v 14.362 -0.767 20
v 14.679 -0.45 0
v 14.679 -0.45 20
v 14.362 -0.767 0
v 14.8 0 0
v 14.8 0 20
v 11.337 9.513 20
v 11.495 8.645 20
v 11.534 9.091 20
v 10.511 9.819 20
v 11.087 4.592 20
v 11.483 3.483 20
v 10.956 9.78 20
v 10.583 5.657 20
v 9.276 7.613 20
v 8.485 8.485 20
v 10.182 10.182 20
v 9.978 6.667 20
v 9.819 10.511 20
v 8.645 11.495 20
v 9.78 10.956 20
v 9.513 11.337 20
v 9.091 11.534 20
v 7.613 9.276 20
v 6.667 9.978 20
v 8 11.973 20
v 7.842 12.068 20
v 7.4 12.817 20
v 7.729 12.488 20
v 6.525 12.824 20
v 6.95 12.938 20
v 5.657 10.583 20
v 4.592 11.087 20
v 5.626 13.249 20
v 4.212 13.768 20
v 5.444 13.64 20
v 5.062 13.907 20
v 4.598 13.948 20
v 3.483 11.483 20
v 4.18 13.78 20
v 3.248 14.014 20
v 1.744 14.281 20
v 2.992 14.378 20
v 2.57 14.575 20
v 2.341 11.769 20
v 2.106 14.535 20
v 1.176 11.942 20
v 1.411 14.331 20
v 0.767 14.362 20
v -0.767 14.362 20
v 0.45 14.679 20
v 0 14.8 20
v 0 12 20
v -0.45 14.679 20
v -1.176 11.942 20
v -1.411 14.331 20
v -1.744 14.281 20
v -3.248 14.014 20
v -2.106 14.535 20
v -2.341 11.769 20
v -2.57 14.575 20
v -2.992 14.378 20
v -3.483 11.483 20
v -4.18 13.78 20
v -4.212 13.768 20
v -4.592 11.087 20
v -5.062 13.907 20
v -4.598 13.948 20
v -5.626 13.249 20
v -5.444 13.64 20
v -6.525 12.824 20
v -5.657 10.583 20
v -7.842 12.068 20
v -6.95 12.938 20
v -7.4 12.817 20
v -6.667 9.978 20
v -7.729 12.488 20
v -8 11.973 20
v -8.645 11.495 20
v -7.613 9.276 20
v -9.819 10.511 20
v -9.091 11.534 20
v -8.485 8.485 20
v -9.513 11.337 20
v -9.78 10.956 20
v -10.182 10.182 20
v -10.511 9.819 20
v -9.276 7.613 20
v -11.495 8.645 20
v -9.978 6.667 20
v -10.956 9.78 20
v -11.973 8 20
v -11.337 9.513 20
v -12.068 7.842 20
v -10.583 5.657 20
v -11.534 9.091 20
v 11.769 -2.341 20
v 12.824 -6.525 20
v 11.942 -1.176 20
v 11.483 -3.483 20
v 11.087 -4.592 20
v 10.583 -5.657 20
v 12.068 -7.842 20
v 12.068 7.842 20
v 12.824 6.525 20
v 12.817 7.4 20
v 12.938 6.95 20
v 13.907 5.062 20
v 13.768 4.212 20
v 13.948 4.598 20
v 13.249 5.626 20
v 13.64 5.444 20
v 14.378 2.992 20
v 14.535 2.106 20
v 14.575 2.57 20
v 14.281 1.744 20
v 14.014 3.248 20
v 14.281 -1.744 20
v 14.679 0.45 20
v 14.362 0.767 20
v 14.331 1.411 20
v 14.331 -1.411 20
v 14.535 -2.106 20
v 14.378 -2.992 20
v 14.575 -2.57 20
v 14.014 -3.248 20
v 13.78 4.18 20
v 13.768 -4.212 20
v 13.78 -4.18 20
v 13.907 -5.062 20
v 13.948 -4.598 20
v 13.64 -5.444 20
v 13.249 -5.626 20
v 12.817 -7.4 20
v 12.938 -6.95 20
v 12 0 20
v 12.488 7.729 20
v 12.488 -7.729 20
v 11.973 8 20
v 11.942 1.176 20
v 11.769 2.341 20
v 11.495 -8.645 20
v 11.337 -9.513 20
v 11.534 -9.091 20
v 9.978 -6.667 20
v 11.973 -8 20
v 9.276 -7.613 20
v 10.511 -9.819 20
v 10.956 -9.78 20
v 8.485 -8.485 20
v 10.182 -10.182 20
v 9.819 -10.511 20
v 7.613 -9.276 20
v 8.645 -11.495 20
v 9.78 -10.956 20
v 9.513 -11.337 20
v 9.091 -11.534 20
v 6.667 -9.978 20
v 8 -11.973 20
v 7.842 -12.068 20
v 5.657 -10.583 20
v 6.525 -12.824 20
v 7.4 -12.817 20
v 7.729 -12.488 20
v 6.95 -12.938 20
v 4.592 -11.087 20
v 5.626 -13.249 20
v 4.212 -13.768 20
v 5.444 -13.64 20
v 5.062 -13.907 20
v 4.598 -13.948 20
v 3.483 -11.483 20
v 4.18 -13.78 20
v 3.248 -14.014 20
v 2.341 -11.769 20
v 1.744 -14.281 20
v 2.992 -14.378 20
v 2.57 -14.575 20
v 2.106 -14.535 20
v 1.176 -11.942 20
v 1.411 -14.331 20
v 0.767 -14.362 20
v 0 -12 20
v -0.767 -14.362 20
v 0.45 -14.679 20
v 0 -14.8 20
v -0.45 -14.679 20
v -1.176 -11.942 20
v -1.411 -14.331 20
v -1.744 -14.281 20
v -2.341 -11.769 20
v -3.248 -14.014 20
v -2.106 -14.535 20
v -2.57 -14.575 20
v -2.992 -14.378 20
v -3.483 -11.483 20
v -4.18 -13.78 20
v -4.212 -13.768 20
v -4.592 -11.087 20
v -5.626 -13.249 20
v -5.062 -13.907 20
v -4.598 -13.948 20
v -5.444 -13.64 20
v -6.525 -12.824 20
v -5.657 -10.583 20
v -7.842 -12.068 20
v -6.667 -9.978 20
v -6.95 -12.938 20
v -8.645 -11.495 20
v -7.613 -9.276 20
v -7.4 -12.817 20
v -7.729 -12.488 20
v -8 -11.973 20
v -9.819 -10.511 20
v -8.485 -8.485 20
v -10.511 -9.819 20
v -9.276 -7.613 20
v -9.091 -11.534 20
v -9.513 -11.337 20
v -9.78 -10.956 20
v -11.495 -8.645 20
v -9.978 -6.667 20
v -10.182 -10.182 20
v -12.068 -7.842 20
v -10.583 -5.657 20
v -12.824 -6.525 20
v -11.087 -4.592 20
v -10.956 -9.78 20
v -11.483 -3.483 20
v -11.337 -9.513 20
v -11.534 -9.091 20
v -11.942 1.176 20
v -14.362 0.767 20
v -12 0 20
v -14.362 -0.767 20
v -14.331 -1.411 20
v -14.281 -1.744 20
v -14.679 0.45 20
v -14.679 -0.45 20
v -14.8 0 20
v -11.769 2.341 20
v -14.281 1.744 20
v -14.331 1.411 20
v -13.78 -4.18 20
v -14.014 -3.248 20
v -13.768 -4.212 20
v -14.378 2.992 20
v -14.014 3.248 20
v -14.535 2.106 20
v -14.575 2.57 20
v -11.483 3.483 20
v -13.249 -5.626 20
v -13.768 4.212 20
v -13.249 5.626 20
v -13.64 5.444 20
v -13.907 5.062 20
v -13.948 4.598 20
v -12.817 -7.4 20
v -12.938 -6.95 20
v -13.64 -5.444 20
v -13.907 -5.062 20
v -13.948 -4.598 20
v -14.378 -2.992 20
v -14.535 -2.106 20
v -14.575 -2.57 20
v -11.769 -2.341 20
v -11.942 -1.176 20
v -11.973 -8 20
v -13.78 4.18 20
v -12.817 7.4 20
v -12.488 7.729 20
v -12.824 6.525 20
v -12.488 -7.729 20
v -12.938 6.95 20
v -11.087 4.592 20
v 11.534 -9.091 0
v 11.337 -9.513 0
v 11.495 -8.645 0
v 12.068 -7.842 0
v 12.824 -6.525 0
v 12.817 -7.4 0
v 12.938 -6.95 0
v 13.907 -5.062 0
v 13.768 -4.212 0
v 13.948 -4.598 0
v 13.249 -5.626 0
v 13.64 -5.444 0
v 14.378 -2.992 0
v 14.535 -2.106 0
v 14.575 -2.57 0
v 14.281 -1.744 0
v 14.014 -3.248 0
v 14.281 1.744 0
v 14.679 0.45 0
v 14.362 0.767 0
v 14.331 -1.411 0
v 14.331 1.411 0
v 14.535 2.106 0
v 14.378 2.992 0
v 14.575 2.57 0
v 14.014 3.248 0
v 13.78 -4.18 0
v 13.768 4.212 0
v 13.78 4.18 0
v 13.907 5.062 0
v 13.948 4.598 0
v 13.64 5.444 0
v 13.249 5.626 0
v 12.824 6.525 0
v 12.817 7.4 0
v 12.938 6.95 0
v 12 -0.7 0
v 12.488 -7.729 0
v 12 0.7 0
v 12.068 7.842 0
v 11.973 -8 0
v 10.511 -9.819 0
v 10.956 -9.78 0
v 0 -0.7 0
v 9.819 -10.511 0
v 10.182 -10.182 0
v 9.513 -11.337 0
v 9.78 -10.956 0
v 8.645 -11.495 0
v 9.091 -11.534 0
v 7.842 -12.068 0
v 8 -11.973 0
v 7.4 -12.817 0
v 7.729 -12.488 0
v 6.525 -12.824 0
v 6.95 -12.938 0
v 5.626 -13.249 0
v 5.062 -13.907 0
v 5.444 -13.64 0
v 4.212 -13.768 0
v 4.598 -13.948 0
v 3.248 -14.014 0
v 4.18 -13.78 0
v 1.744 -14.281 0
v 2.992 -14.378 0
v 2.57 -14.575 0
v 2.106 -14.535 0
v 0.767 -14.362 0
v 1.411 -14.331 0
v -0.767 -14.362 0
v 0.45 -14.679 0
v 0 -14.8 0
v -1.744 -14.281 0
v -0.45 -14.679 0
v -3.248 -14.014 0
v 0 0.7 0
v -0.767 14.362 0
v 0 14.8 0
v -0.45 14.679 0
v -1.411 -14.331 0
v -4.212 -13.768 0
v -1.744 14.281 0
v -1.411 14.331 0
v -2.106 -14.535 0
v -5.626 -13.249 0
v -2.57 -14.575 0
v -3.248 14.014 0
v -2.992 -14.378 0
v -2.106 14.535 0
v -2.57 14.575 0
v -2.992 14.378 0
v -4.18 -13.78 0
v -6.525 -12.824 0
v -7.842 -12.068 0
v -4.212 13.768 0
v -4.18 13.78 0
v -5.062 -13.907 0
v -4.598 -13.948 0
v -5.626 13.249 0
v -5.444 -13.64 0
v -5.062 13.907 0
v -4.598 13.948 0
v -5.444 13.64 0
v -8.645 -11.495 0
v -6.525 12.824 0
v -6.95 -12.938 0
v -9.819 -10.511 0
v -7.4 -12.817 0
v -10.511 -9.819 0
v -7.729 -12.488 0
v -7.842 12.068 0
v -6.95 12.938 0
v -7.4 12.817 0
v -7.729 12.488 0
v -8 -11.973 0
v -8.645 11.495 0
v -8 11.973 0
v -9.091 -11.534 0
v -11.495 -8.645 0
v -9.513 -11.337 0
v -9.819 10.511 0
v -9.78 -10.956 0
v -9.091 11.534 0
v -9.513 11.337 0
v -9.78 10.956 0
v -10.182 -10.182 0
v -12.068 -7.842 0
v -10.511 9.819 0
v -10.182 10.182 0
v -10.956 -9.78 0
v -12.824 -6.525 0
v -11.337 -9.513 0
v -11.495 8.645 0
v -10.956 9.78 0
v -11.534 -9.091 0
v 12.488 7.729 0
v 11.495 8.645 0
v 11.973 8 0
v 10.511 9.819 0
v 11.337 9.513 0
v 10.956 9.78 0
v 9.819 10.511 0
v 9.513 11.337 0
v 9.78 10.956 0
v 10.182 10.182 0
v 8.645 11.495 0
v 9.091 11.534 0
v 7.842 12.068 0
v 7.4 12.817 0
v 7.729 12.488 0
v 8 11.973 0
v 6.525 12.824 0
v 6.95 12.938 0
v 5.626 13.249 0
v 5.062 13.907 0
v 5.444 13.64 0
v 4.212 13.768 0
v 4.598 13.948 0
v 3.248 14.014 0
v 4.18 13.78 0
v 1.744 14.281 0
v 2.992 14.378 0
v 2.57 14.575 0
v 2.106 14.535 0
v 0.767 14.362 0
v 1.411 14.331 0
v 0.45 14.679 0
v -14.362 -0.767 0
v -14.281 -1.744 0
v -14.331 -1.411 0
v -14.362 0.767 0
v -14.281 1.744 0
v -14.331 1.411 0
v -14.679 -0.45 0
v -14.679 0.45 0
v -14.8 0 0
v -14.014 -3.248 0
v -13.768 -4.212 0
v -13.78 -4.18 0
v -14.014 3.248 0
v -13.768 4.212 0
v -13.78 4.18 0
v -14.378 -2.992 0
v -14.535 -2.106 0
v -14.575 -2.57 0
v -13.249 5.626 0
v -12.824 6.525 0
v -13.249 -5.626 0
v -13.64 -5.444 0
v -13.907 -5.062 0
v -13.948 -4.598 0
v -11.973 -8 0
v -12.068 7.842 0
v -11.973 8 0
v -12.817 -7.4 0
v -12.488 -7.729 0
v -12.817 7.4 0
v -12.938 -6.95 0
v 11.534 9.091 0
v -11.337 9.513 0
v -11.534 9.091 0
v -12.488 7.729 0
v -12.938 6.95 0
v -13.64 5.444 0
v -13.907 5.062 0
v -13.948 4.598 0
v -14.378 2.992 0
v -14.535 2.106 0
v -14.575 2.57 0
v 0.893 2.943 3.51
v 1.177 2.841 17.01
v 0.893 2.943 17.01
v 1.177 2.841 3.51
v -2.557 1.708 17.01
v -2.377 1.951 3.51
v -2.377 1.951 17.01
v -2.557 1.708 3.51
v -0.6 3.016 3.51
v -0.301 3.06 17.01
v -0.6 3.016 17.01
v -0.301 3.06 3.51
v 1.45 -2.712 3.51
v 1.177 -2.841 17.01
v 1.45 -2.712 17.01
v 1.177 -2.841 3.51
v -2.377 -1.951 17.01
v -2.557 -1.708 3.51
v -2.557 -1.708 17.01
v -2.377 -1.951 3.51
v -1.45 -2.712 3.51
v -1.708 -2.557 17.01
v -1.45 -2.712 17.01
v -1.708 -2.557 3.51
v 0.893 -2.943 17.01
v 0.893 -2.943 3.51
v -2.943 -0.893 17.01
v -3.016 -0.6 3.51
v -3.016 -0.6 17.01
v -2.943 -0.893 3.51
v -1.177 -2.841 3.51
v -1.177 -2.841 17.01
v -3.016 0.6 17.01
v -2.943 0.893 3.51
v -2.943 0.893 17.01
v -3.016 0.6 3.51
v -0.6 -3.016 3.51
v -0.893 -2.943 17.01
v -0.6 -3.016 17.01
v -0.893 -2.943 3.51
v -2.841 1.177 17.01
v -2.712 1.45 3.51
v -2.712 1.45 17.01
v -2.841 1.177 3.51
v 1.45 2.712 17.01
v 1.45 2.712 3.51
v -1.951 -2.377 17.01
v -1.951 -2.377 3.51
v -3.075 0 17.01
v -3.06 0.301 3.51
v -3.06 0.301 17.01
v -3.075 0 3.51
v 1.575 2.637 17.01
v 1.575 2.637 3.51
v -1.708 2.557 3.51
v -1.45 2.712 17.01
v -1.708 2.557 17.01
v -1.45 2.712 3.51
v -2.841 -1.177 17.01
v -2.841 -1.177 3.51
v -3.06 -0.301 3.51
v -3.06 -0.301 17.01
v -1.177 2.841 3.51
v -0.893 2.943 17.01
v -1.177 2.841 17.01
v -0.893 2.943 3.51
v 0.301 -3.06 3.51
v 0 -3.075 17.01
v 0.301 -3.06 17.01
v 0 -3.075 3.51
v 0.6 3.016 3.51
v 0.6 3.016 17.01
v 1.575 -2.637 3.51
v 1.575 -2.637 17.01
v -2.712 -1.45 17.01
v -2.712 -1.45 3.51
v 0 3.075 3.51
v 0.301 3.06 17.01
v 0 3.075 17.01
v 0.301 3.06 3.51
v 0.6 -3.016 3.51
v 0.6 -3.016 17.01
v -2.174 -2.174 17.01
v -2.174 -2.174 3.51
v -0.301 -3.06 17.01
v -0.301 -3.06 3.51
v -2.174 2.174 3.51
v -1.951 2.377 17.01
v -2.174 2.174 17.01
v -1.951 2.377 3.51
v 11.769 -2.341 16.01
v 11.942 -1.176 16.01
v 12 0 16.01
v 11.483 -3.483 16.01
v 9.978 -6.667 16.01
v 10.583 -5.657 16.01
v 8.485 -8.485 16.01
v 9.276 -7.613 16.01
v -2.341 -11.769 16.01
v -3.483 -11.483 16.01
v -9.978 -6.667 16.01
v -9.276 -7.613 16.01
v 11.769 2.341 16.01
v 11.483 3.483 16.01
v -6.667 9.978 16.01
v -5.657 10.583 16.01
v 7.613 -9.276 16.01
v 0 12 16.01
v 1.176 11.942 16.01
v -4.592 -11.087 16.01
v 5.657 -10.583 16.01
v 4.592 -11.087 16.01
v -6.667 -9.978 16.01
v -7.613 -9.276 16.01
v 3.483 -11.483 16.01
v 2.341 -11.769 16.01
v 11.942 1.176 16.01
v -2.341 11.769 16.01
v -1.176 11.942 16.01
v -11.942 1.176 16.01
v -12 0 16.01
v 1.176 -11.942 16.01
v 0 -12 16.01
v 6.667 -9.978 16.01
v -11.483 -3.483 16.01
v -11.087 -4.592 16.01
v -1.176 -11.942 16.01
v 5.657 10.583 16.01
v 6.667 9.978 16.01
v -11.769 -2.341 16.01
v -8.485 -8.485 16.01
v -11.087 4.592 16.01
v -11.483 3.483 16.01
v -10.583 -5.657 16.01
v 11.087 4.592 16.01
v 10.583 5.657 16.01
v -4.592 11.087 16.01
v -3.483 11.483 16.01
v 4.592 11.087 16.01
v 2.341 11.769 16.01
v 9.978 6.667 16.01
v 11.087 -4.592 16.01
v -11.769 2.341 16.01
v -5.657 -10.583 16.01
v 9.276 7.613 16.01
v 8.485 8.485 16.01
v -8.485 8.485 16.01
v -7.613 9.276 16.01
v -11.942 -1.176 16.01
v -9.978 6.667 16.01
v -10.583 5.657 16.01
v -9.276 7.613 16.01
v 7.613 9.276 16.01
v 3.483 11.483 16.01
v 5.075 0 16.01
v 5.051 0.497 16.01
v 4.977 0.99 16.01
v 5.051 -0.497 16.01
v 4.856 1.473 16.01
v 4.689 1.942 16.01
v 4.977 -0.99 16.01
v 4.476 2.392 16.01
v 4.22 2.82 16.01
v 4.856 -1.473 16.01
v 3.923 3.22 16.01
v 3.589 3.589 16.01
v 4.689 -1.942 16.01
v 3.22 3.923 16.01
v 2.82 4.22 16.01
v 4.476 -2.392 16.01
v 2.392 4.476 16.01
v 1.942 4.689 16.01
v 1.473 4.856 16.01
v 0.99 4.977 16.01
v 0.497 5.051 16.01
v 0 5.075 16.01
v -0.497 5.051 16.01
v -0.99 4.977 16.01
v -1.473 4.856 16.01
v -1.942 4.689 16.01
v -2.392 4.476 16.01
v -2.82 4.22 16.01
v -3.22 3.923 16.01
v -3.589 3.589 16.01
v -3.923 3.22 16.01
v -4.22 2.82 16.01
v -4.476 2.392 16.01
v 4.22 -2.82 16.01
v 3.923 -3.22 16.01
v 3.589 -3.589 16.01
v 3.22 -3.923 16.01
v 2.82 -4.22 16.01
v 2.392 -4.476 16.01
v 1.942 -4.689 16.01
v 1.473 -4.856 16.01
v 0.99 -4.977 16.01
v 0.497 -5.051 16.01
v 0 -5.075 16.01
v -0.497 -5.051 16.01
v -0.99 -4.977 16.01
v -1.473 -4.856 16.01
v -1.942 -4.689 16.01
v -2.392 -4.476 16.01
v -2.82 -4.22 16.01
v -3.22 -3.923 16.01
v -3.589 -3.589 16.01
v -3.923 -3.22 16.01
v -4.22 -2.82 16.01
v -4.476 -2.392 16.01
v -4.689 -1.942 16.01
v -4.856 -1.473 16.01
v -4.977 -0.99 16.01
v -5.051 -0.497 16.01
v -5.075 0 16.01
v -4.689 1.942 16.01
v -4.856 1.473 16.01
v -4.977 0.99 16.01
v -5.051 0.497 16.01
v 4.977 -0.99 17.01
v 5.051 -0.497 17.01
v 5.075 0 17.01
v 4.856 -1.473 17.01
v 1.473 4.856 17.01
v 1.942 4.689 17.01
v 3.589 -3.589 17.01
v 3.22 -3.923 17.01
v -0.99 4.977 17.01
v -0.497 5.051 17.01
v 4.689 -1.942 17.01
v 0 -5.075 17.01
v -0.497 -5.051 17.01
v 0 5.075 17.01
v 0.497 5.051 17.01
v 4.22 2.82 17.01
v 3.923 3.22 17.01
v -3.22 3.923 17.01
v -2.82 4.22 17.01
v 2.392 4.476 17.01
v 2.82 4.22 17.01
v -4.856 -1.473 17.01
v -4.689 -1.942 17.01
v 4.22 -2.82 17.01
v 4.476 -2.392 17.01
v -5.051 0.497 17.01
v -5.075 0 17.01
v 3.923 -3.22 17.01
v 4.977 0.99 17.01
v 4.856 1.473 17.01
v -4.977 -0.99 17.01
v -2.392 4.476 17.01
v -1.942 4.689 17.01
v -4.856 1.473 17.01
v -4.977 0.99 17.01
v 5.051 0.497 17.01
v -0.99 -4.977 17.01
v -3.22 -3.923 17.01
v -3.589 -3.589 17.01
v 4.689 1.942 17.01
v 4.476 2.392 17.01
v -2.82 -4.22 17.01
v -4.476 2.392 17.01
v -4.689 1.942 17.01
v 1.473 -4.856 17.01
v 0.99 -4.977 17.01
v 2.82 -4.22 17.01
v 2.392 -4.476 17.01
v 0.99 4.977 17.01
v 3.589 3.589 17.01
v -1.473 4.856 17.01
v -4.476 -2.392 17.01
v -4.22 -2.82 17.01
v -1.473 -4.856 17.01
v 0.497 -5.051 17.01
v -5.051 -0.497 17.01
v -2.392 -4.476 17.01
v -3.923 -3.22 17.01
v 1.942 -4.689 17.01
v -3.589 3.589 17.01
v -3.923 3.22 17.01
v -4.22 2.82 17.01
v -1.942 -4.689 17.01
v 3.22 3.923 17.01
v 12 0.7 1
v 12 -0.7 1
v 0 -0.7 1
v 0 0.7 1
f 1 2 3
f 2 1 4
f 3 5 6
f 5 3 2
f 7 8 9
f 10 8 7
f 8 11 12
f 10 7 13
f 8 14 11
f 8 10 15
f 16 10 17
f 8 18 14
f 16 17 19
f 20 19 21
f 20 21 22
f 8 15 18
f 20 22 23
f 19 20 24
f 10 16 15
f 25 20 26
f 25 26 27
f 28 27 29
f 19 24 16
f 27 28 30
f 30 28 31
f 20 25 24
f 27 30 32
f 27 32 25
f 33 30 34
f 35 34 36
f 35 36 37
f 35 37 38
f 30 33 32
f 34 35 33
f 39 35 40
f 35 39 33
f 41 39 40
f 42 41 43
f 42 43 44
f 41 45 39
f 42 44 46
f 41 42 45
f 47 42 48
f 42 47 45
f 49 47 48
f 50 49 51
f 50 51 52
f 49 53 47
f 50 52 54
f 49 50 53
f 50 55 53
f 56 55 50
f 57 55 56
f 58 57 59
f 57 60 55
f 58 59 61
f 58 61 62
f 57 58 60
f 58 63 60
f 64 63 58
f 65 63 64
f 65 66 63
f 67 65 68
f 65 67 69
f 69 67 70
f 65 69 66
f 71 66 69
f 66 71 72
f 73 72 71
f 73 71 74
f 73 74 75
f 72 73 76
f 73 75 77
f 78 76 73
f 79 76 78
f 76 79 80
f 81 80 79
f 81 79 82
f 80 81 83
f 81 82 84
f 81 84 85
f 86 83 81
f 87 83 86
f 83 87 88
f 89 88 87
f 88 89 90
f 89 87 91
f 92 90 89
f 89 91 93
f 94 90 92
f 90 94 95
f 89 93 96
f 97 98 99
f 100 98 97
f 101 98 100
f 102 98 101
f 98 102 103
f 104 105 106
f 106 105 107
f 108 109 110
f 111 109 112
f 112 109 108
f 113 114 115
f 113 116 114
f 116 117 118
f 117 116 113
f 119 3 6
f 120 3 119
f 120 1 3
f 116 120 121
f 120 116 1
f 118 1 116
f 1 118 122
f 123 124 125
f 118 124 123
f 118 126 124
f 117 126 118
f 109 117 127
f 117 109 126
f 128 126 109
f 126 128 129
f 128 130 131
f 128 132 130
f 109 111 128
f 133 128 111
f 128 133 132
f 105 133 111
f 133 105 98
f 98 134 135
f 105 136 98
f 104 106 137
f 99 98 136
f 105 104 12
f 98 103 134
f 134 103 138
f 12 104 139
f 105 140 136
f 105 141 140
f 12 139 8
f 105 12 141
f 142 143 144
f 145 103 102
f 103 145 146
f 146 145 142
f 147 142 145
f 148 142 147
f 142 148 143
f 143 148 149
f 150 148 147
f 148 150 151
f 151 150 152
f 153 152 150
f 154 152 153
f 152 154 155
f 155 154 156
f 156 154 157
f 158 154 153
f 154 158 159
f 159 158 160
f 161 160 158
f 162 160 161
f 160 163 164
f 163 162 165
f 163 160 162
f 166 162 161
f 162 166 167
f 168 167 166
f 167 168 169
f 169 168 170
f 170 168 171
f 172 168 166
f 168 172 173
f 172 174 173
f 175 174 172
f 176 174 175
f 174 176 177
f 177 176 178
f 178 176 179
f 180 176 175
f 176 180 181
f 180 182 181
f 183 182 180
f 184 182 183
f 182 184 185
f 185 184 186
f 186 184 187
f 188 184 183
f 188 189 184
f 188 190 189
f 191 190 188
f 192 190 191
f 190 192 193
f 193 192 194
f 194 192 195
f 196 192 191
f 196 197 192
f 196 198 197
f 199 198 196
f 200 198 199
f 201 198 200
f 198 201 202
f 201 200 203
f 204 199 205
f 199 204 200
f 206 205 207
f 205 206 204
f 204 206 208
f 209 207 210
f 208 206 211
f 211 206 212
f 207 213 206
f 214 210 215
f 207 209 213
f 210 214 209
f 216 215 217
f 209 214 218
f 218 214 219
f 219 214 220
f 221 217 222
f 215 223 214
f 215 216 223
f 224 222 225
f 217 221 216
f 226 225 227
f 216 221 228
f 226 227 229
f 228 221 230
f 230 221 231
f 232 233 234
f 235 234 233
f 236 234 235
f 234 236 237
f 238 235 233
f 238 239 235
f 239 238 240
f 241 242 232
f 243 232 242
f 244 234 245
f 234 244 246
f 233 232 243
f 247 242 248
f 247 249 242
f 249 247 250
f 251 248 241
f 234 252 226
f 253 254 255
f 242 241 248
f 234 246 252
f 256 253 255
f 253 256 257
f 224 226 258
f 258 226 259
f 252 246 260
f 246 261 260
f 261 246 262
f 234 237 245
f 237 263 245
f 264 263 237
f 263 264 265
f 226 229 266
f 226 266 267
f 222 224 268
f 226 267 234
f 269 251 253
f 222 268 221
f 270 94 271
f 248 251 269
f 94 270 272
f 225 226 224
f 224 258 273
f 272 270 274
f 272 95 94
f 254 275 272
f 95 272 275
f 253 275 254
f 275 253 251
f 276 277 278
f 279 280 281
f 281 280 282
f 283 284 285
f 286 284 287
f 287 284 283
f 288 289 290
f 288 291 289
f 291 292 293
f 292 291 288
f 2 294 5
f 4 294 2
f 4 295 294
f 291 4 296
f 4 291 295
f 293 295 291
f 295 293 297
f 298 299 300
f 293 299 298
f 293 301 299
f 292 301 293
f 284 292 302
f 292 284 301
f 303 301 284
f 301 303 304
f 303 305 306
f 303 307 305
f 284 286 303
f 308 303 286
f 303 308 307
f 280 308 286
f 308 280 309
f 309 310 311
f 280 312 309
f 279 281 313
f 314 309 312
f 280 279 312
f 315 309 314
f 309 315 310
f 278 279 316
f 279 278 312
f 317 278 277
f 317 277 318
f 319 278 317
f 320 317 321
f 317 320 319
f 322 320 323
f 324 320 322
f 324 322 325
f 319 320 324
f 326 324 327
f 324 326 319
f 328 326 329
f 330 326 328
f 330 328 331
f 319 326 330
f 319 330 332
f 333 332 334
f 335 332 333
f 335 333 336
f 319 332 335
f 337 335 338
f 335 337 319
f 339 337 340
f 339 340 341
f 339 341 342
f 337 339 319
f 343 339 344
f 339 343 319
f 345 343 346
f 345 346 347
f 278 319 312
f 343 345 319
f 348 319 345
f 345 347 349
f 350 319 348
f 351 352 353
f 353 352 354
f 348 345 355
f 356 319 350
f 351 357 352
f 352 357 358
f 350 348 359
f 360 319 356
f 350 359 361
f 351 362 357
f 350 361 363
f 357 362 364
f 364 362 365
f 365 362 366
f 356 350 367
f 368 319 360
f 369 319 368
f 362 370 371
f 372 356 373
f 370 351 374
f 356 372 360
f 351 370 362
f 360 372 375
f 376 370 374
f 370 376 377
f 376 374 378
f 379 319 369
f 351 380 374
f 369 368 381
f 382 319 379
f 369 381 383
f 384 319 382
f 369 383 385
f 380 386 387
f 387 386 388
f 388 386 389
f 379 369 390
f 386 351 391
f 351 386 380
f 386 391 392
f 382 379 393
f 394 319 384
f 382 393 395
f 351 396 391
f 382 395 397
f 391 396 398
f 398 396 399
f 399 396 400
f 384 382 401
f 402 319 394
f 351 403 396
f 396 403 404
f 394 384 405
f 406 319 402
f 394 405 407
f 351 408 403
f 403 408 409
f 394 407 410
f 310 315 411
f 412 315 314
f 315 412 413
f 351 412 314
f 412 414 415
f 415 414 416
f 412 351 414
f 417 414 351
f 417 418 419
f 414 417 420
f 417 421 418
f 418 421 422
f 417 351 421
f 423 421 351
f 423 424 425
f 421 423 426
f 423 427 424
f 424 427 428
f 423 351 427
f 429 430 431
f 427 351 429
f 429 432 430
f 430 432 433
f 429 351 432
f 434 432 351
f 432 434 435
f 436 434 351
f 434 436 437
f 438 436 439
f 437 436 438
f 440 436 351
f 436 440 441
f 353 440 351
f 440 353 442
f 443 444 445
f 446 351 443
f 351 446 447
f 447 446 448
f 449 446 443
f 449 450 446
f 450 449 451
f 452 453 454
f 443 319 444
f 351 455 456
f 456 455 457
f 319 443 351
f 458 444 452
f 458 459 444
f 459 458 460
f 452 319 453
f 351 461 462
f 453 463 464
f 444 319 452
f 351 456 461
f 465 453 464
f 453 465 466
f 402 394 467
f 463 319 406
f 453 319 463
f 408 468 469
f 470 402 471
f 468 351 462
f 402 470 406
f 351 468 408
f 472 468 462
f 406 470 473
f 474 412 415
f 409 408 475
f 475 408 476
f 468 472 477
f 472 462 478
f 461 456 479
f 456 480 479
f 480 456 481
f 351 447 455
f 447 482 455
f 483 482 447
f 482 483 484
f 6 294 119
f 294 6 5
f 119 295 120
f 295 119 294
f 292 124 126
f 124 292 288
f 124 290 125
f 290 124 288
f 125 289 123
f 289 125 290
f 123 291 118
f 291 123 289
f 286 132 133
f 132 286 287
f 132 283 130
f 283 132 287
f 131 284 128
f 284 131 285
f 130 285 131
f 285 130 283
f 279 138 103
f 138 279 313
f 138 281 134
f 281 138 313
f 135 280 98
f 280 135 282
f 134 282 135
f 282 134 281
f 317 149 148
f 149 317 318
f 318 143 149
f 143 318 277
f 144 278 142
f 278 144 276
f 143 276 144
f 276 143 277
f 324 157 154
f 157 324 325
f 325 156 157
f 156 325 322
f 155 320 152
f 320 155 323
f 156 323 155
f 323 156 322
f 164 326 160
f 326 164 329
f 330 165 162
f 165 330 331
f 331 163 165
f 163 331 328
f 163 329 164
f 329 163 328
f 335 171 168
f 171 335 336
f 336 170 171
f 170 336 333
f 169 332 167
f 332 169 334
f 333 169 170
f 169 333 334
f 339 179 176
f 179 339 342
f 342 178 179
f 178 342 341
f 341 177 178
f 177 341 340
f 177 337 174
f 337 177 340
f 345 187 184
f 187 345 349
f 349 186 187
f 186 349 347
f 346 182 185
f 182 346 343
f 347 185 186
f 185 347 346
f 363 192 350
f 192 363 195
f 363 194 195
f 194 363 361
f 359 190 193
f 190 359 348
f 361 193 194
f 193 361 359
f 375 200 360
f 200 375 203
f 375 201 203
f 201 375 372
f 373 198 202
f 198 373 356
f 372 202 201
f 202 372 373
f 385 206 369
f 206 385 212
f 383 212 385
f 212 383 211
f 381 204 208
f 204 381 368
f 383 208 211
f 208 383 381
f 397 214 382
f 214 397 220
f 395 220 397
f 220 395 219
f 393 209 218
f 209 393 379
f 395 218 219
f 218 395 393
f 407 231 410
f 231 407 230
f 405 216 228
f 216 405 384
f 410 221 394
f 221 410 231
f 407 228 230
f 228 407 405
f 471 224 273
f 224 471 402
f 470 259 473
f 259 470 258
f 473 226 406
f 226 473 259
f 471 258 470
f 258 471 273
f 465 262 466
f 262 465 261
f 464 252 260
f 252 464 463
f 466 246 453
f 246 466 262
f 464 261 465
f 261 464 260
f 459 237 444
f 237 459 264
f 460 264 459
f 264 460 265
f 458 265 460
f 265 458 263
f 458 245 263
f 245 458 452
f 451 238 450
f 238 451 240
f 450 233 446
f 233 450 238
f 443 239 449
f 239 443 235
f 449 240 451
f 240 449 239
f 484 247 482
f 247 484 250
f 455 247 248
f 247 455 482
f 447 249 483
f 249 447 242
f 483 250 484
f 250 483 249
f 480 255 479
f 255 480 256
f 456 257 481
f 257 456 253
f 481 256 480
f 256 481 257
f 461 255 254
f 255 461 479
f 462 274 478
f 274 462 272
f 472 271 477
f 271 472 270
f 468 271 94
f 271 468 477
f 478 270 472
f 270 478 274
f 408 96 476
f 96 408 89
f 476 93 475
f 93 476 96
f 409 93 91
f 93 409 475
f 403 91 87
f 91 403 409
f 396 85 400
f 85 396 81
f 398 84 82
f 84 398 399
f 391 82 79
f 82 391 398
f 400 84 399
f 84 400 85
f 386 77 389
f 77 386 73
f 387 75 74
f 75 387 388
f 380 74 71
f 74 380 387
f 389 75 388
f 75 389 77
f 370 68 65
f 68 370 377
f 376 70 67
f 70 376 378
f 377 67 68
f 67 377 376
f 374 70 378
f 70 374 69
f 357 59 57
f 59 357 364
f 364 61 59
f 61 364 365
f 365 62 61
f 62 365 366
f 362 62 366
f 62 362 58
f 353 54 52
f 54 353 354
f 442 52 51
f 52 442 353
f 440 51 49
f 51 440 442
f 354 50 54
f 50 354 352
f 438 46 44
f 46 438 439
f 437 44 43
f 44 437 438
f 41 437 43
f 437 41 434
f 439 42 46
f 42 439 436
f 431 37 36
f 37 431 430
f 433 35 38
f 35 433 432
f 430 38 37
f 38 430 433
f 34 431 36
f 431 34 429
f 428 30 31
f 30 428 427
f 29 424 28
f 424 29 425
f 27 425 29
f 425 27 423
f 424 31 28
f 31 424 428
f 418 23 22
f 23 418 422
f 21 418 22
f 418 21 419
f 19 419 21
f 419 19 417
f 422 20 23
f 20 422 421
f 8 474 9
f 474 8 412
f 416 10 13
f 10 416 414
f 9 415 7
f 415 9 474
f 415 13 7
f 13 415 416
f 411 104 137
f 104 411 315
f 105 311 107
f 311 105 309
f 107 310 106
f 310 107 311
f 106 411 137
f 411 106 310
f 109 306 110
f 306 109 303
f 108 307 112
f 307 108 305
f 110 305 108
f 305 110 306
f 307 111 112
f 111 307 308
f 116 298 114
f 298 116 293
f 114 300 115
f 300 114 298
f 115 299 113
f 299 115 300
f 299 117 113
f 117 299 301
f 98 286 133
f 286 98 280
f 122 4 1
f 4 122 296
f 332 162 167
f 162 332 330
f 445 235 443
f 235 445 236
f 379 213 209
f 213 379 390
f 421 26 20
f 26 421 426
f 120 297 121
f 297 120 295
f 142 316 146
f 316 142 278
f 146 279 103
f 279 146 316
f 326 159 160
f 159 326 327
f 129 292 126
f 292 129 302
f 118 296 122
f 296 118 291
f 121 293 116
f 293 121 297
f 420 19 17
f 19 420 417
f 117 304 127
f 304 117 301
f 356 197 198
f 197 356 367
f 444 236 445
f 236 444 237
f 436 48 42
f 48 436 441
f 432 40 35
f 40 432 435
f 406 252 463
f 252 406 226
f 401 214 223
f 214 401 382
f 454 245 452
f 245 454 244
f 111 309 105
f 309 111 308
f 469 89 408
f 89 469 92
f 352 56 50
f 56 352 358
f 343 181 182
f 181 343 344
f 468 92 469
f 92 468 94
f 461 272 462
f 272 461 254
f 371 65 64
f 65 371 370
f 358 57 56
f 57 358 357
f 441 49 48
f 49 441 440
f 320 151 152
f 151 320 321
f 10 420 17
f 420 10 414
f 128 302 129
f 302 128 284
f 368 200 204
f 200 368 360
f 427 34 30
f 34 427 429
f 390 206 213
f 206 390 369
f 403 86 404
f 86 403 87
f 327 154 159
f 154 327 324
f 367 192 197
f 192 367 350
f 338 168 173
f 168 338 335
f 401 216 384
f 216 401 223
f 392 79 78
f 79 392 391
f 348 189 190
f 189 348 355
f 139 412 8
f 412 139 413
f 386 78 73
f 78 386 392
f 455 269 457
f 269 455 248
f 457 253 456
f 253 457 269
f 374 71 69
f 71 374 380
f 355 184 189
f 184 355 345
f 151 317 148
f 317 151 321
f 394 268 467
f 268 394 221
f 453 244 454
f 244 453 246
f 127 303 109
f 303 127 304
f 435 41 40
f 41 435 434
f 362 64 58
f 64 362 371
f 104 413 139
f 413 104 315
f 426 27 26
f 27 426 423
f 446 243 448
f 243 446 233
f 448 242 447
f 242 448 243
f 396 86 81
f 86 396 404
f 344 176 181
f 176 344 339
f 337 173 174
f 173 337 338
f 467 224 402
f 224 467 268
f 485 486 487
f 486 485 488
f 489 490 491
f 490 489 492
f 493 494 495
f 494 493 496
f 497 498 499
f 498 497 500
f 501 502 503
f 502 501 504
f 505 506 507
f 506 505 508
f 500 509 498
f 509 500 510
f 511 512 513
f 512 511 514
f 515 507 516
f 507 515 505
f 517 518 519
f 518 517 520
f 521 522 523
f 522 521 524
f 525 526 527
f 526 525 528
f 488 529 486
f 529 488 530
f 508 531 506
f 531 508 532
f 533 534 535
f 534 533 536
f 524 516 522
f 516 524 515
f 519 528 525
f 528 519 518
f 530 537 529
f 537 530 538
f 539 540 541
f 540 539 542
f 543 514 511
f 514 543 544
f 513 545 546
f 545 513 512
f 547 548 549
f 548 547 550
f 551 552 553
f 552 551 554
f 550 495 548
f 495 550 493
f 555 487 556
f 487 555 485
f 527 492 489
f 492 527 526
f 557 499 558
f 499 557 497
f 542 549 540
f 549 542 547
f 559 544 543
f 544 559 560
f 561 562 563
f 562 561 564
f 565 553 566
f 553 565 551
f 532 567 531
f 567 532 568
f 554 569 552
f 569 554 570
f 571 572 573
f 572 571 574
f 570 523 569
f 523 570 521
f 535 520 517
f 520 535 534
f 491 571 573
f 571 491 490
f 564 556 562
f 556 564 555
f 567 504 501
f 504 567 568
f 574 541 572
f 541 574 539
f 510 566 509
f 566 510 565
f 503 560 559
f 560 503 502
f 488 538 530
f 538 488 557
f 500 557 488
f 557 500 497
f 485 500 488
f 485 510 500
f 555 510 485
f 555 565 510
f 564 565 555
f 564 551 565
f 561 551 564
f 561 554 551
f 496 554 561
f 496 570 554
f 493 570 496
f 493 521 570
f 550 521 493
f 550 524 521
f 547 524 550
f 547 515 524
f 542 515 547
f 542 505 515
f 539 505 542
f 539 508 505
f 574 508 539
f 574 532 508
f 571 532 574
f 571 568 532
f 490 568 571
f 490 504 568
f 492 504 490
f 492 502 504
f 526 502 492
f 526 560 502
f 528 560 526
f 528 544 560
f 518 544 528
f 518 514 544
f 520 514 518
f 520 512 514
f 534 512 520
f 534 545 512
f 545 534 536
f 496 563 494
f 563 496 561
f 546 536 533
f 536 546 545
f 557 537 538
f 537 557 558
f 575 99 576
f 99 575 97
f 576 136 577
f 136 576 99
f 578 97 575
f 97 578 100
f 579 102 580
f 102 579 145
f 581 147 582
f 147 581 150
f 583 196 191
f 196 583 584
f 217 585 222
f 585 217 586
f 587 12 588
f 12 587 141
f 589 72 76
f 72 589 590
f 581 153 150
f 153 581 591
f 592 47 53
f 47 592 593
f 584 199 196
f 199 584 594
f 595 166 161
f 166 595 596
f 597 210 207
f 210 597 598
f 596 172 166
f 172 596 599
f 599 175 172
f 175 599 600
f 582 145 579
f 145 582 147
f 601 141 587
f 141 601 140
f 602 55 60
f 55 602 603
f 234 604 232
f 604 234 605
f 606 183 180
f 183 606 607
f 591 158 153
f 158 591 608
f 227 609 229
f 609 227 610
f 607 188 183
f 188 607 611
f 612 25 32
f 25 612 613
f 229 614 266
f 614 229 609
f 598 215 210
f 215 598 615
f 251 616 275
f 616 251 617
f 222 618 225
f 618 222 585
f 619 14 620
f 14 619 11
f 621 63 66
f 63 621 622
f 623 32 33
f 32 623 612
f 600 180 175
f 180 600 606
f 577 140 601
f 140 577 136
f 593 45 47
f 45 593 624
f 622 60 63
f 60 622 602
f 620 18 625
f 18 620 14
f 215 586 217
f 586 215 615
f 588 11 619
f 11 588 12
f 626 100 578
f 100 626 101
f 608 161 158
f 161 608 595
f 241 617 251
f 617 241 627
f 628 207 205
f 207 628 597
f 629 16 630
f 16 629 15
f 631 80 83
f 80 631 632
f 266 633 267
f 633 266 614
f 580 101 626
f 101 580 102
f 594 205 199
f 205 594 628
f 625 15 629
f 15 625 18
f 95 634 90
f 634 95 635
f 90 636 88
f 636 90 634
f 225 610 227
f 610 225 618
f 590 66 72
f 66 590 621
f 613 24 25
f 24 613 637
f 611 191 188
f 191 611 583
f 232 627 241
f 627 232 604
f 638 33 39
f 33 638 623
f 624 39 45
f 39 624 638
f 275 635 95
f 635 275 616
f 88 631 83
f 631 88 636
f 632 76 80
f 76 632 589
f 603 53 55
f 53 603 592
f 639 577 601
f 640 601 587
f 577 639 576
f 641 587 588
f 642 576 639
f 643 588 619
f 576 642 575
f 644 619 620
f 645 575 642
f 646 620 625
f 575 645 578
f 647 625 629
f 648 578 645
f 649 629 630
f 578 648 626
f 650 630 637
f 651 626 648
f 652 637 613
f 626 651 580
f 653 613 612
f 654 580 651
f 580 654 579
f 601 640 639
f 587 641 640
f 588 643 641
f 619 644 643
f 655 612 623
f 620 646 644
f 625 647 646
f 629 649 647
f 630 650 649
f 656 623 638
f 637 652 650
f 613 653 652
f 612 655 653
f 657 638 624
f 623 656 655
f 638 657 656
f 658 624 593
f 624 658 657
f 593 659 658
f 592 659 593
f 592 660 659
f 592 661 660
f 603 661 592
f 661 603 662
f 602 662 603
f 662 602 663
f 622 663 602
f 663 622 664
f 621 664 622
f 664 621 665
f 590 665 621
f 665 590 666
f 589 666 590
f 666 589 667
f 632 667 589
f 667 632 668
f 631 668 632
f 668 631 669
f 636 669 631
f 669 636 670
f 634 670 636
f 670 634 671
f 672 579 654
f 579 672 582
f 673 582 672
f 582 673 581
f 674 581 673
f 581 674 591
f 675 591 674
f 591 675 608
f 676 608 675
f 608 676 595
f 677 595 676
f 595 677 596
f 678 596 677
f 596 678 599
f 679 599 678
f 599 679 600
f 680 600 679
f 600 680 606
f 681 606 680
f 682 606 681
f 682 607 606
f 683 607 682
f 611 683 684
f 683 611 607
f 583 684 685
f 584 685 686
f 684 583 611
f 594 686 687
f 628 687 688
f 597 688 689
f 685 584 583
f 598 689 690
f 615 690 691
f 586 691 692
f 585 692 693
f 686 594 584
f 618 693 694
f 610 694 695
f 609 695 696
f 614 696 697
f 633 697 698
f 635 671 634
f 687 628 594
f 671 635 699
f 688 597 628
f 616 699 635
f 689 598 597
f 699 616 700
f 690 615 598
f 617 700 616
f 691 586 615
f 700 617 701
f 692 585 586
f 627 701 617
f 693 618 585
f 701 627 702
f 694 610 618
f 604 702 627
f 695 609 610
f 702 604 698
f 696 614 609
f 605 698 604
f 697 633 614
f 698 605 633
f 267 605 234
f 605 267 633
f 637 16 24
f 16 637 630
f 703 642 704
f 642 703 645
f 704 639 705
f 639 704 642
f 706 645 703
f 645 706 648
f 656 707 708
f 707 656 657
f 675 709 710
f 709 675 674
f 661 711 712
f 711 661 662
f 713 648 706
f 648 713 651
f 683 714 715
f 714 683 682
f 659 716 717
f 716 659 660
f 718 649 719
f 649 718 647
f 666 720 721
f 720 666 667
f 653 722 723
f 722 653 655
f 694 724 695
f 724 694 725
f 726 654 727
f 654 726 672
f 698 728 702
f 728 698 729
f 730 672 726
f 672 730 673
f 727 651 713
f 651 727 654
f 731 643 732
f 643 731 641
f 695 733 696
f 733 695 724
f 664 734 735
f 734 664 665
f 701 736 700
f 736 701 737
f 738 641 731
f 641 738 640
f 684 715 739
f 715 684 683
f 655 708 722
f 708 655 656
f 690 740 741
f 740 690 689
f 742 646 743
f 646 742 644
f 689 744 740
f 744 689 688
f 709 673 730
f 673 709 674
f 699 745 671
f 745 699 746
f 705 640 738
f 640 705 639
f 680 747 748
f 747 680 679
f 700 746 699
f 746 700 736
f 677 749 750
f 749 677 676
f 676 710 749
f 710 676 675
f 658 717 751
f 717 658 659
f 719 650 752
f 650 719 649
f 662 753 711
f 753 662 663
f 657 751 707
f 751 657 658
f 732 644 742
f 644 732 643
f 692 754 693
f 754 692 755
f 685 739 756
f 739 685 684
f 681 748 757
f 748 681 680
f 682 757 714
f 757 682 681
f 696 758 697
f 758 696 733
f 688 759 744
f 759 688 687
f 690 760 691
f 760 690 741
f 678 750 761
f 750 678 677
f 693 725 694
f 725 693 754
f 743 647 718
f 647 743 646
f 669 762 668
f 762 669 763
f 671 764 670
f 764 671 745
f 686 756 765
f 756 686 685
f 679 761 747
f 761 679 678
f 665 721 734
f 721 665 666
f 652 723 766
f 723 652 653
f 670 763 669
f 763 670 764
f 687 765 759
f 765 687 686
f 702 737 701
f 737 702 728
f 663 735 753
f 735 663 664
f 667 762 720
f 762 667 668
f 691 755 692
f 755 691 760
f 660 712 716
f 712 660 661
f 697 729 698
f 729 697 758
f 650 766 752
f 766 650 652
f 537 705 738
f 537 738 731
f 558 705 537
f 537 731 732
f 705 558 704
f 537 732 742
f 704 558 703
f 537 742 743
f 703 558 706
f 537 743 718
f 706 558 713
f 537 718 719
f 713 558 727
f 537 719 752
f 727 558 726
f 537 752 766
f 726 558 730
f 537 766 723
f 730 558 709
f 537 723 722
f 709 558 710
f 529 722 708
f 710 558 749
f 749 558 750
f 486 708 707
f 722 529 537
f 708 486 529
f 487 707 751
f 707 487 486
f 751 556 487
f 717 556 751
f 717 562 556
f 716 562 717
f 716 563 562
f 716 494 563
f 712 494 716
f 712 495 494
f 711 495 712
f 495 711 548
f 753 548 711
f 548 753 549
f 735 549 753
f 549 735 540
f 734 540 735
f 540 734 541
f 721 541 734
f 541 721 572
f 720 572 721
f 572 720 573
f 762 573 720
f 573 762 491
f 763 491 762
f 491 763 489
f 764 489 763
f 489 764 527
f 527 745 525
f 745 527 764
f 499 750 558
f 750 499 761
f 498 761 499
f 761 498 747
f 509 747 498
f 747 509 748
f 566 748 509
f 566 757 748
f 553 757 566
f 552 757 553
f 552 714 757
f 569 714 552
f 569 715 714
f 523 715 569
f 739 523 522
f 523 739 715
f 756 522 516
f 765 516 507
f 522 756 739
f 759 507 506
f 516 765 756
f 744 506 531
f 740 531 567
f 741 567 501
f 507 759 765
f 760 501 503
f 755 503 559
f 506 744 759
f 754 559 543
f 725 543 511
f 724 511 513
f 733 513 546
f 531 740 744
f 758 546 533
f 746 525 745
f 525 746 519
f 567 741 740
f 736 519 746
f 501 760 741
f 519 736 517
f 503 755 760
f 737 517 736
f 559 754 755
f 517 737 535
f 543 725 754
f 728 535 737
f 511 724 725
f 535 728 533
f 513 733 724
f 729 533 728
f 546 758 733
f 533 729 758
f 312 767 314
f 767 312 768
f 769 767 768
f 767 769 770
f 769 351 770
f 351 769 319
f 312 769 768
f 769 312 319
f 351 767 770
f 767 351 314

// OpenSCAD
// SleepRadioPi box: the encoder knob on its own, so it can be printed
// separately (e.g. in a different colour from the box).
//
// Same knob as part="knob" in sleepradiopi_box.scad -- keep the two in step if
// either changes. Fits an EC11 encoder's 6 mm D-shaft, 20 mm long from the bushing's base.
//
// Printed top face down (the pointer groove is on the bed side), no supports:
//   openscad --backend=manifold -o stl/knob.stl knob.scad
// Sunburst version (the front grilles' fan engraved in the top, rising towards
// where the groove would point):
//   openscad --backend=manifold -D 'knob_style="sunburst"' -o stl/knob_sunburst.stl knob.scad
//
// Millimetres.

knob_d      = 30;        // overall diameter across the grip ribs
knob_h      = 20;
shaft_d     = 6.15;      // D-shaft bore (6 mm shaft + clearance)
shaft_flat  = 4.65;      // bore width across the flat
shaft_len   = 16.5;      // bore depth: a 20 mm EC11 shaft stands ~18 mm above the
                         // case (2 mm wall at the pocket), so the knob clears it by ~1.5 mm
nut_recess_d = 12;       // under the knob, round the encoder's M7 nut + washer
nut_recess_h = 3;
skirt_h     = 4;         // hollow underneath so the knob clears the encoder nut

knob_style  = "plain";   // "plain" (pointer groove) or "sunburst"
// Sunburst: the grille's fan scaled to the knob (same numbers as
// sleepradiopi_box.scad: rays over +-80 degrees, half-sun and arc at 8/34 and
// 20/34 of the diameter, an extra ray between each pair above the arc)
fan_d       = 26;
fan_rays    = 7;
fan_spread  = 80;
fan_rib_w   = 1.4;
engrave     = 0.8;

$fn = 64;

module knob() {
    difference() {
        union() {
            cylinder(d = knob_d - 1.2, h = knob_h);
            // 36 grip ribs round the edge
            for (a = [0 : 360 / 36 : 359]) rotate([0, 0, a])
                translate([knob_d / 2 - 1.1, 0, 0]) cylinder(d = 1.8, h = knob_h, $fn = 12);
        }
        // Shaft bore, D at the top, and the nut recess
        translate([0, 0, -0.01]) intersection() {
            cylinder(d = shaft_d, h = shaft_len);
            translate([-shaft_d / 2, -shaft_d / 2, 0]) cube([shaft_flat, shaft_d, shaft_len]);
        }
        translate([0, 0, -0.01]) cylinder(d = nut_recess_d, h = nut_recess_h);
        // Hollow skirt around the shaft so the knob clears the nut
        translate([0, 0, -0.01]) difference() {
            cylinder(d = knob_d - 6, h = skirt_h);
            cylinder(d = shaft_d + 4, h = skirt_h);
        }
        if (knob_style == "sunburst")
            translate([0, 0, knob_h - engrave]) linear_extrude(engrave + 0.01) rotate(-90) fan2d();
        else
            // Pointer groove on the top face
            translate([0, -0.7, knob_h - 1]) cube([knob_d / 2 - 3, 1.4, 1.2]);
    }
}

// The fan's open slots (engraved), rising along +y from a half-sun at the bottom
module fan2d() {
    hub_r = fan_d * 8 / 34;
    arc_r = fan_d * 20 / 34;
    step = 2 * fan_spread / (fan_rays - 1);
    module ray(a, r0) rotate(90 + a) translate([r0, -fan_rib_w / 2]) square([fan_d * 2, fan_rib_w]);
    translate([0, -fan_d / 2]) difference() {
        translate([0, fan_d / 2]) circle(d = fan_d);
        circle(r = hub_r);
        for (i = [0 : fan_rays - 1]) ray(-fan_spread + i * step, 0);
        for (i = [0 : fan_rays - 2]) ray(-fan_spread + (i + 0.5) * step, arc_r);
        difference() { circle(r = arc_r + fan_rib_w / 2); circle(r = arc_r - fan_rib_w / 2); }
    }
}

// Top face down on the bed
translate([0, 0, knob_h]) rotate([180, 0, 0]) knob();
